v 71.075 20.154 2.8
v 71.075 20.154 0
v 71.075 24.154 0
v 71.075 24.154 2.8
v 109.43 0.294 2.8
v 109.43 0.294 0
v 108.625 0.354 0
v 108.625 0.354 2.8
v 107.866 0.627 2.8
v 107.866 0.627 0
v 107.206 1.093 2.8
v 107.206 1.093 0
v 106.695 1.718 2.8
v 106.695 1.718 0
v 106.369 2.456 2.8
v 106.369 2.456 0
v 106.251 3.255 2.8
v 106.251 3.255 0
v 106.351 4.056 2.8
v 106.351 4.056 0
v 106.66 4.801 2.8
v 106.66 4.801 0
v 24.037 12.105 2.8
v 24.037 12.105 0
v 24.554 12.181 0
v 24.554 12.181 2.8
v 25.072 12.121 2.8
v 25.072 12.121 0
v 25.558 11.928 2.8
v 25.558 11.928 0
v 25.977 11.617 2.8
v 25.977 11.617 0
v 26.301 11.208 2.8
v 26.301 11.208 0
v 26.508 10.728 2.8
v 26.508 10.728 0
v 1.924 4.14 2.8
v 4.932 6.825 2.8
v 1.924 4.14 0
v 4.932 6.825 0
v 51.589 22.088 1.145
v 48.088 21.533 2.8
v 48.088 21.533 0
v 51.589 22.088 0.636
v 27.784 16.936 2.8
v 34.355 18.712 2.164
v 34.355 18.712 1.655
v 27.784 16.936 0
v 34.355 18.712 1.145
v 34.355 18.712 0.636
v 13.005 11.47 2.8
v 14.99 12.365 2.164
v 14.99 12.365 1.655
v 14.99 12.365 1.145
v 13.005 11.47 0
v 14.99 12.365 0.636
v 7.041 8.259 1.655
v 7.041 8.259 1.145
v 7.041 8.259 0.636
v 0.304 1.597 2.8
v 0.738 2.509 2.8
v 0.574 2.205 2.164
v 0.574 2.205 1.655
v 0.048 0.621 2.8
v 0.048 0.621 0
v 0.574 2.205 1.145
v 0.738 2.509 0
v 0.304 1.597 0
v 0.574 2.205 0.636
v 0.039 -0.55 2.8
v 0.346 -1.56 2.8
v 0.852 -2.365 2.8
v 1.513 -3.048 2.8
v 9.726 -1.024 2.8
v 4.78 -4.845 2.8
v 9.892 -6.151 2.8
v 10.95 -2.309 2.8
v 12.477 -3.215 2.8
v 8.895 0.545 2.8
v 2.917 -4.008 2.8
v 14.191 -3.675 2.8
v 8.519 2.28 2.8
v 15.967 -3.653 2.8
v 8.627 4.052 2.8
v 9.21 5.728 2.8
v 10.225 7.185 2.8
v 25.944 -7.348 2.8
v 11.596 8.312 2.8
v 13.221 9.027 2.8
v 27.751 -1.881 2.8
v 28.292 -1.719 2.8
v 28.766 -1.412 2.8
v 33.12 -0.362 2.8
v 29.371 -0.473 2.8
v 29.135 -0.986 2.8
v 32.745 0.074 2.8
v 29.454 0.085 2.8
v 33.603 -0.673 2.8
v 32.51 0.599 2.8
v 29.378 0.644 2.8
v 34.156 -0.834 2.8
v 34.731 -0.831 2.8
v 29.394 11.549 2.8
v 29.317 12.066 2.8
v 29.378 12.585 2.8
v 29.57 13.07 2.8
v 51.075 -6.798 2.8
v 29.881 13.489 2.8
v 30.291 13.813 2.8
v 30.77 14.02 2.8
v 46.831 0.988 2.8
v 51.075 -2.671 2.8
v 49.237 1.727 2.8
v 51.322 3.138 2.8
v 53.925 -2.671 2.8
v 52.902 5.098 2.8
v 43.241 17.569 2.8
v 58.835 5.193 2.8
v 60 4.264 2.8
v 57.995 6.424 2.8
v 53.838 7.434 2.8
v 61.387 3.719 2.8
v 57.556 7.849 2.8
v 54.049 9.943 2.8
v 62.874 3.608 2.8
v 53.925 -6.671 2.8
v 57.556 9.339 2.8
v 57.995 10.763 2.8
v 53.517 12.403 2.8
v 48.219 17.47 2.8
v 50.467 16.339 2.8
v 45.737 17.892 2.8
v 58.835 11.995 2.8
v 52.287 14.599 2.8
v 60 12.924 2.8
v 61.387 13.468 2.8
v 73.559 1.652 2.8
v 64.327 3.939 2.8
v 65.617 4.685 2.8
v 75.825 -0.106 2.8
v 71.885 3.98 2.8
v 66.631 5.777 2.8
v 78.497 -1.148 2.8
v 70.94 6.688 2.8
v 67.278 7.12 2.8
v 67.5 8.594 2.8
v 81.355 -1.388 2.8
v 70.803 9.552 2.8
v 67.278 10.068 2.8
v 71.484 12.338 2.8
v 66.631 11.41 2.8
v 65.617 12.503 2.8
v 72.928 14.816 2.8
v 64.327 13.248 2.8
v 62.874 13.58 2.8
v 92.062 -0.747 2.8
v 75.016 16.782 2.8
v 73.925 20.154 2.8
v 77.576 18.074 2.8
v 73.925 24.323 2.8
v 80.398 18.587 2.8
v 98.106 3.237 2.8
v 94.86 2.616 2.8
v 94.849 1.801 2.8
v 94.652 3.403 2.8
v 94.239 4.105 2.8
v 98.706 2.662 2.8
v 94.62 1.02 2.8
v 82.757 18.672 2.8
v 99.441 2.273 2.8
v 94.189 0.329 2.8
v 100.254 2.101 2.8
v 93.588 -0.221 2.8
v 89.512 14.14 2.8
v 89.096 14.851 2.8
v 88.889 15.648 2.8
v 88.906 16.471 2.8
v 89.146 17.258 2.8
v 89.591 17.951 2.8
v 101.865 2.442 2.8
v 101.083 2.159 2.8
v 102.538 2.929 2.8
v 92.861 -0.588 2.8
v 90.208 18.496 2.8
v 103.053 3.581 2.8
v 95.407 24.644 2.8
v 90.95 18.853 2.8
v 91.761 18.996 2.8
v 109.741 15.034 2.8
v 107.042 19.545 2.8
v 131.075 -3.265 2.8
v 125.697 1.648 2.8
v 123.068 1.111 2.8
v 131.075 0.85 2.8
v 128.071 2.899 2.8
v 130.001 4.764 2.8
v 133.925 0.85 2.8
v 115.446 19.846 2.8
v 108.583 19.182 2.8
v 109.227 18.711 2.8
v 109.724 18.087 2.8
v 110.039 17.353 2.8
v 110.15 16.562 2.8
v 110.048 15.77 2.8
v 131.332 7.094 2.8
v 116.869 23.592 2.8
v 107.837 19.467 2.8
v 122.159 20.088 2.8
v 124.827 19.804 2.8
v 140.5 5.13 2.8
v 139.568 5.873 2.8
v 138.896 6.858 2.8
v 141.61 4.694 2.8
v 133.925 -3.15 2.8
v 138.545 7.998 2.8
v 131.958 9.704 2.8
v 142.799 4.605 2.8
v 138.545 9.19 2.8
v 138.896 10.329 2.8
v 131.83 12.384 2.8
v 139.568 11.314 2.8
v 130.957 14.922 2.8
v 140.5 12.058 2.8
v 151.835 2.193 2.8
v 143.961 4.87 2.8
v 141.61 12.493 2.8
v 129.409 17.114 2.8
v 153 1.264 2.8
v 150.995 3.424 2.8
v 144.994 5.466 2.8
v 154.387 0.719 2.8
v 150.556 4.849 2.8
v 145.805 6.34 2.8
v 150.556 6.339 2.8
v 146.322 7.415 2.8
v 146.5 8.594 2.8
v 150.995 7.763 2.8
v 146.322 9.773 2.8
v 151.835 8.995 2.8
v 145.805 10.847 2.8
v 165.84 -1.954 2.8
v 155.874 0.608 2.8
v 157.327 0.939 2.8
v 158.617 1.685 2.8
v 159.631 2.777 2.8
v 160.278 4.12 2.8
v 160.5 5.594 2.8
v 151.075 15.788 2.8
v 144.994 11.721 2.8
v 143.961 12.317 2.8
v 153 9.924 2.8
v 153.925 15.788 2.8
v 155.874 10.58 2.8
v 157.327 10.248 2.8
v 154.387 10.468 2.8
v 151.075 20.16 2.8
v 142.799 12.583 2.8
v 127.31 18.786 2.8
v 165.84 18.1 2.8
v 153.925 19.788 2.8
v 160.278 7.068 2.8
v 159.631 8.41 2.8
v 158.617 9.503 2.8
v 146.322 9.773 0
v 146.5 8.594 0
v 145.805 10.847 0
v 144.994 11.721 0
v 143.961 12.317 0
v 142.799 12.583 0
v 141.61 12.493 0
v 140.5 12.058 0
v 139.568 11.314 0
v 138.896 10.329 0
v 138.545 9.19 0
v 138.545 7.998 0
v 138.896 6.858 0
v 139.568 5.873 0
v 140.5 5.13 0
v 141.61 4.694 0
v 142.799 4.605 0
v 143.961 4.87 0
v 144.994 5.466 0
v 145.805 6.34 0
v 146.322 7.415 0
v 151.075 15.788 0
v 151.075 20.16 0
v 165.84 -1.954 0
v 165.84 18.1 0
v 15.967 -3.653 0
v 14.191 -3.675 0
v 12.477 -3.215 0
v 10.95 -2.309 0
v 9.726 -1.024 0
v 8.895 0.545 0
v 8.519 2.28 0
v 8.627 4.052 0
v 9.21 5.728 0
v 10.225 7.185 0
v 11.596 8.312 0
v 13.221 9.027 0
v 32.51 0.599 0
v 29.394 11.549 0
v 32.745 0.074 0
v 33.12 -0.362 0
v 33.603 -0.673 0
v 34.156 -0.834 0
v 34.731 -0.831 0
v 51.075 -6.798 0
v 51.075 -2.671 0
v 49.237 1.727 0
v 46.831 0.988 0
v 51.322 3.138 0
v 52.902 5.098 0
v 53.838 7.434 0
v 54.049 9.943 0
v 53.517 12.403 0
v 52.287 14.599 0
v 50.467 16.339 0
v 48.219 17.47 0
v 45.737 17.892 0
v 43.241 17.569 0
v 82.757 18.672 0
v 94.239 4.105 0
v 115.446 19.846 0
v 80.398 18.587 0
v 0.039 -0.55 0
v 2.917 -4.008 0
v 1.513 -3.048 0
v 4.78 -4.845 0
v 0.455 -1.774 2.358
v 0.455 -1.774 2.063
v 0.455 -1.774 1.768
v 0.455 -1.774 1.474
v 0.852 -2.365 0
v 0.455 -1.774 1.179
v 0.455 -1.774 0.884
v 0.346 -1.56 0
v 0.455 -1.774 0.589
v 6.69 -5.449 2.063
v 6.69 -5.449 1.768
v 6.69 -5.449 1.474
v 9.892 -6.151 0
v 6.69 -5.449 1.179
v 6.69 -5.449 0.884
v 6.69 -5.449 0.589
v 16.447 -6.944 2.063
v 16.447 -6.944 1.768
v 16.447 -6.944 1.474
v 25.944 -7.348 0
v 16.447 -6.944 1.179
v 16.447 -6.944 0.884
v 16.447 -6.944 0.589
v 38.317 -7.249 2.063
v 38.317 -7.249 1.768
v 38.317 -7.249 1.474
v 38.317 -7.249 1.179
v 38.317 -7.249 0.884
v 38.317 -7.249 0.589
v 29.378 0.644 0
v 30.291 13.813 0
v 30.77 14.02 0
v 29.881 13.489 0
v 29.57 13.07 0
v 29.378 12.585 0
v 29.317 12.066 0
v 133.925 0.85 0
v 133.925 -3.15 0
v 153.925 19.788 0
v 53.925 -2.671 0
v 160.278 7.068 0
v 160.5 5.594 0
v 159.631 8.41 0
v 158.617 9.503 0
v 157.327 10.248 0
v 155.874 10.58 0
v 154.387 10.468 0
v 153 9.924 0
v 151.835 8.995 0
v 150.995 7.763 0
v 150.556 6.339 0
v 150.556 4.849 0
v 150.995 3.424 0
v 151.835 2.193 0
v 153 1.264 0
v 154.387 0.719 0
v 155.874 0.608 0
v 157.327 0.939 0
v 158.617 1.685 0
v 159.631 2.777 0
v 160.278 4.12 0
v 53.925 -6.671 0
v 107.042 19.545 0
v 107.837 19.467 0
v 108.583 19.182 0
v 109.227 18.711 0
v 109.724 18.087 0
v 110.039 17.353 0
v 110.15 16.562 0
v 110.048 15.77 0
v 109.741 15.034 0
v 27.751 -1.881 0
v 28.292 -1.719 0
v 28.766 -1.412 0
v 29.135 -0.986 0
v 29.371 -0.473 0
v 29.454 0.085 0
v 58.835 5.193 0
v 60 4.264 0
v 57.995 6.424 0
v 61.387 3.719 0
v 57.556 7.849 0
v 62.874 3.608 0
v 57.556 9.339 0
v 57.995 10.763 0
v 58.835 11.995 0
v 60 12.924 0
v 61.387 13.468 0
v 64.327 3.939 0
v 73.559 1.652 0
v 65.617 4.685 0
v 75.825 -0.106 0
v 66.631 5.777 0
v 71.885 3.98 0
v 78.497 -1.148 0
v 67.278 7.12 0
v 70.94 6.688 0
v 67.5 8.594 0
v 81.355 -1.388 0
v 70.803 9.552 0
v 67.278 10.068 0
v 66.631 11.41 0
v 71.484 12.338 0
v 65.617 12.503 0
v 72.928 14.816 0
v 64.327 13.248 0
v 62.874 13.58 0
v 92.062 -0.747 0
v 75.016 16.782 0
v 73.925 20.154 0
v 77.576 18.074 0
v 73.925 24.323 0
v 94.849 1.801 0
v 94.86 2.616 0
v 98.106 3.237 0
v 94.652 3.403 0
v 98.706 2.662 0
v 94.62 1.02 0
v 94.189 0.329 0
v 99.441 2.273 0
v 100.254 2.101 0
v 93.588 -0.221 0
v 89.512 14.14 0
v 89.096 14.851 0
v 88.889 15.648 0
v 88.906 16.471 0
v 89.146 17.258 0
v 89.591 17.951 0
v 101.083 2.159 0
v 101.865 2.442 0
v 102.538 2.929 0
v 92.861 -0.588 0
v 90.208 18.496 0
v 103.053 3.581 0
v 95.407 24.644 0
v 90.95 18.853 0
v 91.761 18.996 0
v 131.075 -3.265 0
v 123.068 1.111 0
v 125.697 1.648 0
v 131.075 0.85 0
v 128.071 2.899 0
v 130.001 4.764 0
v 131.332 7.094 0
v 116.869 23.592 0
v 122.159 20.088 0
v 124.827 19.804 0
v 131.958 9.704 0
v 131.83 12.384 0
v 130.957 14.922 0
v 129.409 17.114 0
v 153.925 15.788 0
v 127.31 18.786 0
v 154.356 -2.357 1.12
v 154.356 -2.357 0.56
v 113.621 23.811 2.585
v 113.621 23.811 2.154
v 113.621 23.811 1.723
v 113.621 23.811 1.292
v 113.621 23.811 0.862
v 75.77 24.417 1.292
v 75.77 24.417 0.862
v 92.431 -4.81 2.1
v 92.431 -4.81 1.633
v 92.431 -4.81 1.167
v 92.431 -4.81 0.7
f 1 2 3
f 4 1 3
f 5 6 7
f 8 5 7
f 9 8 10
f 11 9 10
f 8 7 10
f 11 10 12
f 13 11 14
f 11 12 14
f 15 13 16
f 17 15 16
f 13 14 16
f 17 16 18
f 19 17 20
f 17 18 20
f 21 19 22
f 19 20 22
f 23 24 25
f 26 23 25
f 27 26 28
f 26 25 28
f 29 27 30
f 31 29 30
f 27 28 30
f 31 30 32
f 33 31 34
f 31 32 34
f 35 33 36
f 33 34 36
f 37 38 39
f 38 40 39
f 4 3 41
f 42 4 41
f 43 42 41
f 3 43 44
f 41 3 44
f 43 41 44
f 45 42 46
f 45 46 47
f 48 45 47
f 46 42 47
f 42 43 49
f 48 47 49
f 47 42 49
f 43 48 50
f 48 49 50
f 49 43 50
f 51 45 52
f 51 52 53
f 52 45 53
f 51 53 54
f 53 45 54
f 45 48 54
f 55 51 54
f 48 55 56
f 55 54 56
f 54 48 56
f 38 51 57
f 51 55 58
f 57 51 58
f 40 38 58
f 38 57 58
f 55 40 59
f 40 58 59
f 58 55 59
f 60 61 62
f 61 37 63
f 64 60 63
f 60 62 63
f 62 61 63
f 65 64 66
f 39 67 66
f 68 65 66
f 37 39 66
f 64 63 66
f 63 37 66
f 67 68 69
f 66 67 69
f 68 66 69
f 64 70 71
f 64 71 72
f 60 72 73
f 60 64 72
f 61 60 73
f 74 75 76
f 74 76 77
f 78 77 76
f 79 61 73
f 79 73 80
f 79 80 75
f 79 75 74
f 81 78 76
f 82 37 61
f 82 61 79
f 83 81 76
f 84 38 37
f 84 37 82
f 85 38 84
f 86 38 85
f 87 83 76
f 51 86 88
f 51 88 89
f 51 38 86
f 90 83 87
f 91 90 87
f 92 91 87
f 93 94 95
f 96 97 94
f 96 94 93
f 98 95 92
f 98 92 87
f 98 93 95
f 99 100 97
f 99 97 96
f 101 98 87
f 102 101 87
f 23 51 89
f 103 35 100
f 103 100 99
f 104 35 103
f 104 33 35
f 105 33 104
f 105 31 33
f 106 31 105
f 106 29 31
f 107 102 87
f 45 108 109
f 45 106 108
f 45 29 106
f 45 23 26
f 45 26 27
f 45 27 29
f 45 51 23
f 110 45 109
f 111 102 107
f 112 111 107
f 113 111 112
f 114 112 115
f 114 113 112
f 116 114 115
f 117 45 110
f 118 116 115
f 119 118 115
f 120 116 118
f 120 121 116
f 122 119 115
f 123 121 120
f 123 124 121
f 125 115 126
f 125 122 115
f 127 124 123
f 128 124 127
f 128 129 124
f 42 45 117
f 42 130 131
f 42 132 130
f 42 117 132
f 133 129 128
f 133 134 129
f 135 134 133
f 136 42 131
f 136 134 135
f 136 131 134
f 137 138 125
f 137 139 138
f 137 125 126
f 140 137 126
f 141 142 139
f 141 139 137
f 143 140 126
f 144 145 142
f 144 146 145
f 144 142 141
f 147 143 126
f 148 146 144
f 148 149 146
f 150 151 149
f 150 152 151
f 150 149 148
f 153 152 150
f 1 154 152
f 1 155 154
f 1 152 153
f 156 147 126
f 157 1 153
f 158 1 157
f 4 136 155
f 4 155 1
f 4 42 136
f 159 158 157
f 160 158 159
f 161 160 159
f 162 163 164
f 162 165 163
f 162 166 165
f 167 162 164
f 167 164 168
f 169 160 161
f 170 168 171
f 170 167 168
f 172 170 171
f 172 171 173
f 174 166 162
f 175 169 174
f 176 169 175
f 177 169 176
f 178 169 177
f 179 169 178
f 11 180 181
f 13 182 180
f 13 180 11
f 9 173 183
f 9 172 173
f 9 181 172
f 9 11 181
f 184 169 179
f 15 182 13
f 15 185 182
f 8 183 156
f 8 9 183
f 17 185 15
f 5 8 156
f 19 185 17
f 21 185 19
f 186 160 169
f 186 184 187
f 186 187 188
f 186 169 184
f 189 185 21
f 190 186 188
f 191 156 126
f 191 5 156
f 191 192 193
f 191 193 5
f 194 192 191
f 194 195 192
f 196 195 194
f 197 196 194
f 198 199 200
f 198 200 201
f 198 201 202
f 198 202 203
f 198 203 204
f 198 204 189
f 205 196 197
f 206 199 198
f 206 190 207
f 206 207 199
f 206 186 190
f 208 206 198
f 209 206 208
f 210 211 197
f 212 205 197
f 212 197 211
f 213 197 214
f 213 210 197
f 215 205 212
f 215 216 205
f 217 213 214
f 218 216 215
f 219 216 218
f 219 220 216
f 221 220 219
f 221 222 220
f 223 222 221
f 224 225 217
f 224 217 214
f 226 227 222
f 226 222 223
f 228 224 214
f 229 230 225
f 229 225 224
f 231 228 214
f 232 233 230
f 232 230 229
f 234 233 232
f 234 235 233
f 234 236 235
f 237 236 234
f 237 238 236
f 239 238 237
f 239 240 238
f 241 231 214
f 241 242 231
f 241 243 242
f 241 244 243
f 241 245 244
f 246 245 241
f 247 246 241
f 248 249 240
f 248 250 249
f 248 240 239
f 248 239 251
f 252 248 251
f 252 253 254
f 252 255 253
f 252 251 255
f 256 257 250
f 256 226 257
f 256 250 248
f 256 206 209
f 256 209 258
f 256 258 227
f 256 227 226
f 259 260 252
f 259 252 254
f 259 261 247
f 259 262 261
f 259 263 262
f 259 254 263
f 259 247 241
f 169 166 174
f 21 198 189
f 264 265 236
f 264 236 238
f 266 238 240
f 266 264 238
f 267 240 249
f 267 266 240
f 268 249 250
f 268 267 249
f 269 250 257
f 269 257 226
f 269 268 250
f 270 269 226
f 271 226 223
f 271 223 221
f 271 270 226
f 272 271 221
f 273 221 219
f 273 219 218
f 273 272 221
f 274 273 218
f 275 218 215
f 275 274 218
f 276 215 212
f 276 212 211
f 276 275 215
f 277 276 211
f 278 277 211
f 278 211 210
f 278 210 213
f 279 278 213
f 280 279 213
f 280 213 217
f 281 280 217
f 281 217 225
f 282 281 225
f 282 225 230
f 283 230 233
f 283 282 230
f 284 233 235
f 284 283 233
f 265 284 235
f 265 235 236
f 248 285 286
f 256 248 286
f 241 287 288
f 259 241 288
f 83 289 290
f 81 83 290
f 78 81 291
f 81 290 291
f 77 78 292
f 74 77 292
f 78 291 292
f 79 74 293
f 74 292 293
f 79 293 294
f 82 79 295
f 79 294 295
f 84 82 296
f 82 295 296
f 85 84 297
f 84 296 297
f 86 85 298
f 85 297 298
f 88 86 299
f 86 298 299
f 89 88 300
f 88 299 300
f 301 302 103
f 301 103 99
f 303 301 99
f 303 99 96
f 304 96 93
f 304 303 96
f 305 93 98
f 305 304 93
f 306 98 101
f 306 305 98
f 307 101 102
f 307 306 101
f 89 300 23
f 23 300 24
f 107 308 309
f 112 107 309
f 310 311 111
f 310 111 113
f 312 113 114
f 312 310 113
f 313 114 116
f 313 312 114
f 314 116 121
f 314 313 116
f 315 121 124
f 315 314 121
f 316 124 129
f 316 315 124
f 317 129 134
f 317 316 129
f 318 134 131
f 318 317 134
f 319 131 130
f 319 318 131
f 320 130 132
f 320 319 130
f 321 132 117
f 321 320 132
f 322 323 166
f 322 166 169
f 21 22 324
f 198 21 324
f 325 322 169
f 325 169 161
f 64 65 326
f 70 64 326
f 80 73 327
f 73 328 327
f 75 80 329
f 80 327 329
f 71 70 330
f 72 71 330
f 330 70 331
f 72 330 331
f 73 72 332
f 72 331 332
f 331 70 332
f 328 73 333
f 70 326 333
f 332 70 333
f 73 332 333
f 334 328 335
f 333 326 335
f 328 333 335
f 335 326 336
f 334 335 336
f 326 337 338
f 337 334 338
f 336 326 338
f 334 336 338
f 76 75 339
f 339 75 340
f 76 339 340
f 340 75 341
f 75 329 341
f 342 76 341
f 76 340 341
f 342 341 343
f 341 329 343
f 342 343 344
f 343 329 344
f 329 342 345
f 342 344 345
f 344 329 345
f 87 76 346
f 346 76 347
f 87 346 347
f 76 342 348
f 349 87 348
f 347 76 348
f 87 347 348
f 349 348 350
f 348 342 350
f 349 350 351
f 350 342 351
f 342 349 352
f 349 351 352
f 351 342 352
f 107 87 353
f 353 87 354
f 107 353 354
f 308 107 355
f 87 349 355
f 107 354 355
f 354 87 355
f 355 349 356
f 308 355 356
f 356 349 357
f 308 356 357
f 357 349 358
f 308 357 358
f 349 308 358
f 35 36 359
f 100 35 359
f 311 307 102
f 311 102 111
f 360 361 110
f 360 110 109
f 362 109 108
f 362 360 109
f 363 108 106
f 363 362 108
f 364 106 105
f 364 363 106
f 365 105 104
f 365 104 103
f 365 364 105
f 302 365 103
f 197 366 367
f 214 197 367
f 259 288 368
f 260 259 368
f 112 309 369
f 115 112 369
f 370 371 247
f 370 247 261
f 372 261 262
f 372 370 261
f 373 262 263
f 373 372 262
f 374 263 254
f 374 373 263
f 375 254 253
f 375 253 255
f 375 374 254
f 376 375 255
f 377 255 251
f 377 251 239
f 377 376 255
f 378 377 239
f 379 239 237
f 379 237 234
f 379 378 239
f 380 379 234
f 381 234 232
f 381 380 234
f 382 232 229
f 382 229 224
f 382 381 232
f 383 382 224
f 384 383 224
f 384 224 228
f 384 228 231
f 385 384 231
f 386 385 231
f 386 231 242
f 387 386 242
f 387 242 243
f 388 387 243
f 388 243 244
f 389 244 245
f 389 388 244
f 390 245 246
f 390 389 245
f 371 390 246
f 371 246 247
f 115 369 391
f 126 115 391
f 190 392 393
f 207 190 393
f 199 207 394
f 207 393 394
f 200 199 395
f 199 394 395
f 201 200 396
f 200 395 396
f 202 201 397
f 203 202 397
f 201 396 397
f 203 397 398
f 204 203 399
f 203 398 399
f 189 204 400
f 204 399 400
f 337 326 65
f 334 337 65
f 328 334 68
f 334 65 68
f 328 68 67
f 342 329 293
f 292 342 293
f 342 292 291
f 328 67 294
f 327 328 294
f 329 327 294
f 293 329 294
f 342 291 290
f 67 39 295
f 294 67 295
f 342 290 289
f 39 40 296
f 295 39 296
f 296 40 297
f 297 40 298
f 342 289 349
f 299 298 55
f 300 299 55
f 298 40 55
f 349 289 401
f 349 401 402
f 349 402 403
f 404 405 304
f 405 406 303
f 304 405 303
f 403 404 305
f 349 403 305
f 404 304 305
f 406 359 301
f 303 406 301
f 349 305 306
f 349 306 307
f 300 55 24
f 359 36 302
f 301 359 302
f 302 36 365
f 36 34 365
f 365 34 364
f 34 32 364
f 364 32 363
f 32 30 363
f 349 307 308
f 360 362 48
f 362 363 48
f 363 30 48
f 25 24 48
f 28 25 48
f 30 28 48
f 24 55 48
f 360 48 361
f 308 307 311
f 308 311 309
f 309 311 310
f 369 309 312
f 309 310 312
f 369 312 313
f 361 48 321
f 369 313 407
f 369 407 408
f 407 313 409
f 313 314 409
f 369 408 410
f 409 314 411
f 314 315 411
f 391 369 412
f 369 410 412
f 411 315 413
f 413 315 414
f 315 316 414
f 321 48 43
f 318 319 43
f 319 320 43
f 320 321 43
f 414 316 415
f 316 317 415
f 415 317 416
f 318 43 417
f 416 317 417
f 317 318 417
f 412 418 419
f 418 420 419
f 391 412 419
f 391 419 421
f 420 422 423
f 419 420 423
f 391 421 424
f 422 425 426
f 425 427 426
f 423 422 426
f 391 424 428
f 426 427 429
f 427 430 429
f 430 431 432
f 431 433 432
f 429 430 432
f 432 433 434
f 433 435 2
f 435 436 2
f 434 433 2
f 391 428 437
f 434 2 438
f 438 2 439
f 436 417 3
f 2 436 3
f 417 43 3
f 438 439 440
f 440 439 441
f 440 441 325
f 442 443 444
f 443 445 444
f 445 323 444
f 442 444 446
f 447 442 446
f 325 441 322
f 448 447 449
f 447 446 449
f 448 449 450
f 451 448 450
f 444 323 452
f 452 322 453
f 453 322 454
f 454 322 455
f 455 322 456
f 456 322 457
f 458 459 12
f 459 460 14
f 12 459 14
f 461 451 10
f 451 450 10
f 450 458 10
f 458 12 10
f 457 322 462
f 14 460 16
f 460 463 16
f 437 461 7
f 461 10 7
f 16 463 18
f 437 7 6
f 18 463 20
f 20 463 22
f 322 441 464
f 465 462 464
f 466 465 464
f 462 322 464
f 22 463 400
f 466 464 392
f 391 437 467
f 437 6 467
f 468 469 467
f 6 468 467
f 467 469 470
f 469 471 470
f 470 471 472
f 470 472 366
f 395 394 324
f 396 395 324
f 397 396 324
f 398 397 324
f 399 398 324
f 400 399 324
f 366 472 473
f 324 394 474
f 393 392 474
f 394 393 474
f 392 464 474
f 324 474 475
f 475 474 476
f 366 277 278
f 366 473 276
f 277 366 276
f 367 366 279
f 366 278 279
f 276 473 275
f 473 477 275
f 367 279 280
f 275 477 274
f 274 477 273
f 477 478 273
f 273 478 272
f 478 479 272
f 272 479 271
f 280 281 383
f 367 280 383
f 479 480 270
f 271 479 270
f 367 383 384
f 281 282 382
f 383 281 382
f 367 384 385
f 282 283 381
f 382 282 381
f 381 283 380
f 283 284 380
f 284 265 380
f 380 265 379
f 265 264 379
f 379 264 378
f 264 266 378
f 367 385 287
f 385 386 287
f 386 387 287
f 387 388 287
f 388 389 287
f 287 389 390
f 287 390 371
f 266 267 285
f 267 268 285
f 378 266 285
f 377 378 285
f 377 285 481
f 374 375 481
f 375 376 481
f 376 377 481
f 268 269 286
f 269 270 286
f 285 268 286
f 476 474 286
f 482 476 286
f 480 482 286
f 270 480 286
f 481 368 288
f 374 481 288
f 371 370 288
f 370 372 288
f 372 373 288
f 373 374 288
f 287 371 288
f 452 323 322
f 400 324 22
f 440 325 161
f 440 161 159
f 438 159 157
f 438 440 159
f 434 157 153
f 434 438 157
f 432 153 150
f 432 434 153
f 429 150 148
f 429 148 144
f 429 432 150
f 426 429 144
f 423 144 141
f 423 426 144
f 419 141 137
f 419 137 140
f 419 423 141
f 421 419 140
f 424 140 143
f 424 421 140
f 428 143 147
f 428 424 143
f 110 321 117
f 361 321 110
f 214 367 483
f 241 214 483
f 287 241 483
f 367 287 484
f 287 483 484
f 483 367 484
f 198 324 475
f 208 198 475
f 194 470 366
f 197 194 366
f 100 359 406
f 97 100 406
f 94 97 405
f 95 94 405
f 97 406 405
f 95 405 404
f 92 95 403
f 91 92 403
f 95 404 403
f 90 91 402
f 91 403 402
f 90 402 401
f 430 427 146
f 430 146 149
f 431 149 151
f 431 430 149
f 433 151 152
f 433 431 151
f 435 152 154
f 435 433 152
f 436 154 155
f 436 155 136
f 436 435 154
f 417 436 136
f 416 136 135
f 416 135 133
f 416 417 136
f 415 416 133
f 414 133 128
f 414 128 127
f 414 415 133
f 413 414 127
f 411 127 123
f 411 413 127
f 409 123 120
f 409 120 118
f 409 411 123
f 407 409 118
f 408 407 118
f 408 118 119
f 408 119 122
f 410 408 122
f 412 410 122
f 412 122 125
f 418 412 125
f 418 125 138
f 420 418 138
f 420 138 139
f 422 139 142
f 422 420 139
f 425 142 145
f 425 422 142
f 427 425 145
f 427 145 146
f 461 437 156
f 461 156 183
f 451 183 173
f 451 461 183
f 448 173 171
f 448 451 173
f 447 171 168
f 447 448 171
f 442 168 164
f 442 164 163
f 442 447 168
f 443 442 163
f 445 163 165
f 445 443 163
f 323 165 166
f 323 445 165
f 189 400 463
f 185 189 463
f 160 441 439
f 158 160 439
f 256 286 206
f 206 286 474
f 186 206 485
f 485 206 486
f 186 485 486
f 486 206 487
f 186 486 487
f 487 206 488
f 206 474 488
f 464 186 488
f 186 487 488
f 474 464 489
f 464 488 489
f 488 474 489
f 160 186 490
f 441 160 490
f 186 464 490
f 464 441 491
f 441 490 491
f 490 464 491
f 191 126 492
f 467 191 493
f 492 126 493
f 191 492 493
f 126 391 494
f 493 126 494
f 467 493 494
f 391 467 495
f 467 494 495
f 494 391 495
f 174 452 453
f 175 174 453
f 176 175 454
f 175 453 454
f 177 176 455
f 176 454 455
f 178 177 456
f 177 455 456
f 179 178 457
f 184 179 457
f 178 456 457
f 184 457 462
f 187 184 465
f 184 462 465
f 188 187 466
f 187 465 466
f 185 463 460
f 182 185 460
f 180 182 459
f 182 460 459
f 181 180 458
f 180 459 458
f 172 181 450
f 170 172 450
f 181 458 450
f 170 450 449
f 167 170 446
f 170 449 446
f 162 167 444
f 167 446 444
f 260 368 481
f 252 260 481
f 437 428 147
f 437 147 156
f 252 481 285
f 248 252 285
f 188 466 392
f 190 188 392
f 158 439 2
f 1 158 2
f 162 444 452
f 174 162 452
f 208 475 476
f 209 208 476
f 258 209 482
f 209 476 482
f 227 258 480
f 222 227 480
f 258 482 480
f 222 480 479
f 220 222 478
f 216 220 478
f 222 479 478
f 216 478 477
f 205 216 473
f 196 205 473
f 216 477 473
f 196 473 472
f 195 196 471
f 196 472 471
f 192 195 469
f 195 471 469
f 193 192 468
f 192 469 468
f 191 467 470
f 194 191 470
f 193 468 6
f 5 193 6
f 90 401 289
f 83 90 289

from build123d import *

# Parameters (mm, degrees)
SKETCH_1_R      = 5
SKETCH_1_R_2    = 4
EXTRUDE_1_DEPTH = 2.8


with BuildPart() as part:
    # Эскиз1 → Бобышка-Вытянуть1 (new body)
    with BuildSketch(Plane.XY):
        with BuildLine():
            Line((51.075, -6.797857762), (51.075, -2.671024813))
            Line((51.075, -2.671024813), (53.925, -2.671024813))
            Line((53.925, -2.671024813), (53.925, -6.671024813))
            add(Edge.make_bspline(
                [(53.925, -6.671024813), (55.351490294, -6.605959917), (59.05614038, -6.431258156), (65.052094605, -6.132852265), (71.910772709, -5.784005177), (78.771375576, -5.439680454), (85.610498609, -5.110951253), (92.432107589, -4.804953326), (99.25503119, -4.531981655), (106.097378404, -4.278274671), (112.96921168, -4.003089926), (119.864404254, -3.723176184), (125.90387692, -3.475714107), (129.641442278, -3.32330159), (131.075, -3.26507525)],
                knots=[0.225936021, 0.225936021, 0.225936021, 0.225936021, 0.242837762, 0.269833583, 0.296993022, 0.324123272, 0.351139107, 0.378035509, 0.404946016, 0.431960837, 0.459078395, 0.4863474, 0.51364083, 0.530622671, 0.530622671, 0.530622671, 0.530622671], degree=3))
            Line((131.075, -3.26507525), (131.075, 0.850340271))
            Line((131.075, 0.850340271), (133.925, 0.850340271))
            Line((133.925, 0.850340271), (133.925, -3.149659729))
            add(Edge.make_bspline(
                [(133.925, -3.149659729), (136.145172751, -3.06004469), (140.661874906, -2.879263539), (147.472013762, -2.613922958), (154.352602411, -2.355626415), (160.474257398, -2.136272457), (164.302612812, -2.005285527), (165.840234812, -1.953741117)],
                knots=[0.541876261, 0.541876261, 0.541876261, 0.541876261, 0.568176028, 0.595379569, 0.622543445, 0.64967326, 0.667883054, 0.667883054, 0.667883054, 0.667883054], degree=3))
            Line((165.840234812, -1.953741117), (165.840234812, 18.100452406))
            add(Edge.make_bspline(
                [(165.840234812, 18.100452406), (163.683203223, 18.425232173), (159.71367048, 19.003973482), (155.73921581, 19.54780728), (153.925, 19.788481571)],
                knots=[0.333153584, 0.333153584, 0.333153584, 0.333153584, 0.358484538, 0.379736754, 0.379736754, 0.379736754, 0.379736754], degree=3))
            Line((153.925, 19.788481571), (153.925, 15.788481571))
            Line((153.925, 15.788481571), (151.075, 15.788481571))
            Line((151.075, 15.788481571), (151.075, 20.160319166))
            add(Edge.make_bspline(
                [(151.075, 20.160319166), (149.474284365, 20.365643283), (145.693646108, 20.836528447), (139.731359791, 21.525676112), (133.19183673, 22.212004247), (126.658683026, 22.825721427), (120.136770918, 23.363973265), (113.628567141, 23.824677323), (107.152732038, 24.200242593), (100.741095693, 24.498399509), (94.411752715, 24.686649768), (88.155917993, 24.74009565), (81.949043055, 24.658849143), (77.209841741, 24.491488886), (74.539946654, 24.3566888), (73.925, 24.323459936)],
                knots=[0.390862166, 0.390862166, 0.390862166, 0.390862166, 0.409602822, 0.435103874, 0.460559416, 0.485959195, 0.51130307, 0.536551515, 0.561723366, 0.586628867, 0.611085431, 0.6352512, 0.659272176, 0.683163753, 0.690315121, 0.690315121, 0.690315121, 0.690315121], degree=3))
            Line((73.925, 24.323459936), (73.925, 20.153723887))
            Line((73.925, 20.153723887), (71.075, 20.153723887))
            Line((71.075, 20.153723887), (71.075, 24.153723887))
            add(Edge.make_bspline(
                [(71.075, 24.153723887), (70.597576883, 24.122634423), (68.091396965, 23.952373351), (63.575410501, 23.578006361), (57.55518955, 22.924946658), (51.605762688, 22.119065522), (45.744400311, 21.156564432), (39.995857594, 20.035371389), (34.397919842, 18.756316234), (29.010382103, 17.327615608), (23.925798408, 15.771864921), (19.270678839, 14.134269434), (15.179098391, 12.483335438), (11.74047579, 10.895610995), (8.959371868, 9.429577365), (6.76089118, 8.108603199), (5.033709747, 6.924638055), (3.671694933, 5.854229664), (2.592101123, 4.871305369), (1.738175668, 3.952595743), (1.069870829, 3.080946373), (0.57164541, 2.241622102), (0.215773898, 1.430785397), (0.102255581, 0.883241694), (0.047974999, 0.621425)],
                knots=[0.701366418, 0.701366418, 0.701366418, 0.701366418, 0.706922144, 0.73053591, 0.7539832, 0.77723469, 0.800246382, 0.822950709, 0.845237155, 0.866915896, 0.887662335, 0.906968281, 0.924203157, 0.938878975, 0.950931611, 0.960693484, 0.968646729, 0.975232933, 0.980794744, 0.985583761, 0.989781539, 0.993521313, 0.996902113, 1, 1, 1, 1], degree=3))
            add(Edge.make_bspline(
                [(0.047974999, 0.621425), (0.02271382, 0.373490086), (-0.02782079, -0.122499975), (0.077991212, -0.88443459), (0.34969565, -1.63883807), (0.814331135, -2.365068924), (1.46348078, -3.039275245), (2.290973016, -3.66099947), (3.30592875, -4.235779621), (4.535255619, -4.773674144), (6.029745688, -5.282192165), (7.868981215, -5.765316676), (10.168831391, -6.221716593), (13.075438188, -6.639618731), (16.728115362, -6.992956738), (21.189952095, -7.247345145), (26.399984415, -7.376638849), (32.197398563, -7.376256913), (38.397806758, -7.26143658), (44.732922785, -7.060594684), (48.984926453, -6.888384617), (51.075, -6.797857762)],
                knots=[0, 0, 0, 0, 0.002941446, 0.005884319, 0.00901613, 0.012364547, 0.016007934, 0.020036845, 0.024573728, 0.029783835, 0.03589701, 0.04324044, 0.052275965, 0.063634589, 0.077983176, 0.095698161, 0.116520086, 0.13966073, 0.16431217, 0.18991889, 0.214680528, 0.214680528, 0.214680528, 0.214680528], degree=3))
        make_face()
        with Locations((62.5, 8.59375181)):
            Circle(SKETCH_1_R, mode=Mode.SUBTRACT)
        with Locations((142.5, 8.59375181)):
            Circle(SKETCH_1_R_2, mode=Mode.SUBTRACT)
        with Locations((155.5, 5.59375181)):
            Circle(SKETCH_1_R, mode=Mode.SUBTRACT)
        with BuildLine():
            Line((43.240598635, 17.569188334), (30.769830614, 14.020476962))
            ThreePointArc((30.769830614, 14.020476962), (29.569945088, 13.069992625), (29.393591817, 11.549451512))
            Line((29.393591817, 11.549451512), (32.509646584, 0.599111496))
            ThreePointArc((32.509646584, 0.599111496), (33.350387753, -0.534966909), (34.730673801, -0.831260624))
            Line((34.730673801, -0.831260624), (46.83094942, 0.988248665))
            ThreePointArc((46.83094942, 0.988248665), (53.874493573, 11.192609045), (43.240598635, 17.569188334))
        make_face(mode=Mode.SUBTRACT)
        with BuildLine():
            Line((91.760538944, 18.995521102), (107.042168691, 19.544535755))
            ThreePointArc((107.042168691, 19.544535755), (109.724415488, 18.086521736), (109.740513943, 15.033655279))
            Line((109.740513943, 15.033655279), (103.052906026, 3.581390706))
            ThreePointArc((103.052906026, 3.581390706), (100.670558856, 2.101444773), (98.106171984, 3.237111085))
            Line((98.106171984, 3.237111085), (89.512150154, 14.140361006))
            ThreePointArc((89.512150154, 14.140361006), (89.14598265, 17.258116644), (91.760538944, 18.995521102))
        make_face(mode=Mode.SUBTRACT)
        with BuildLine():
            Line((81.355051643, -1.388349261), (92.062288682, -0.74685976))
            ThreePointArc((92.062288682, -0.74685976), (94.620029356, 1.019769542), (94.238973726, 4.104864849))
            Line((94.238973726, 4.104864849), (82.75700632, 18.672056169))
            Line((82.75700632, 18.672056169), (80.397973485, 18.587304502))
            ThreePointArc((80.397973485, 18.587304502), (70.768464506, 8.115178476), (81.355051643, -1.388349261))
        make_face(mode=Mode.SUBTRACT)
        with BuildLine():
            Line((106.660222673, 4.801131795), (115.446016039, 19.846456126))
            Line((115.446016039, 19.846456126), (122.158918806, 20.087626868))
            ThreePointArc((122.158918806, 20.087626868), (131.989114723, 11.048396476), (123.068143057, 1.110755792))
            Line((123.068143057, 1.110755792), (109.430271671, 0.293686806))
            ThreePointArc((109.430271671, 0.293686806), (106.694931094, 1.71757295), (106.660222673, 4.801131795))
        make_face(mode=Mode.SUBTRACT)
        with BuildLine():
            Line((26.508143632, 10.728361523), (29.377650553, 0.644432062))
            ThreePointArc((29.377650553, 0.644432062), (29.13549016, -0.985852219), (27.751413523, -1.880726711))
            Line((27.751413523, -1.880726711), (15.966534054, -3.652810119))
            ThreePointArc((15.966534054, -3.652810119), (8.647226299, 1.39933087), (13.220971689, 9.02673198))
            Line((13.220971689, 9.02673198), (24.037118182, 12.104600319))
            ThreePointArc((24.037118182, 12.104600319), (25.557659294, 11.928247048), (26.508143632, 10.728361523))
        make_face(mode=Mode.SUBTRACT)
    extrude(amount=EXTRUDE_1_DEPTH)


solid = part.part
